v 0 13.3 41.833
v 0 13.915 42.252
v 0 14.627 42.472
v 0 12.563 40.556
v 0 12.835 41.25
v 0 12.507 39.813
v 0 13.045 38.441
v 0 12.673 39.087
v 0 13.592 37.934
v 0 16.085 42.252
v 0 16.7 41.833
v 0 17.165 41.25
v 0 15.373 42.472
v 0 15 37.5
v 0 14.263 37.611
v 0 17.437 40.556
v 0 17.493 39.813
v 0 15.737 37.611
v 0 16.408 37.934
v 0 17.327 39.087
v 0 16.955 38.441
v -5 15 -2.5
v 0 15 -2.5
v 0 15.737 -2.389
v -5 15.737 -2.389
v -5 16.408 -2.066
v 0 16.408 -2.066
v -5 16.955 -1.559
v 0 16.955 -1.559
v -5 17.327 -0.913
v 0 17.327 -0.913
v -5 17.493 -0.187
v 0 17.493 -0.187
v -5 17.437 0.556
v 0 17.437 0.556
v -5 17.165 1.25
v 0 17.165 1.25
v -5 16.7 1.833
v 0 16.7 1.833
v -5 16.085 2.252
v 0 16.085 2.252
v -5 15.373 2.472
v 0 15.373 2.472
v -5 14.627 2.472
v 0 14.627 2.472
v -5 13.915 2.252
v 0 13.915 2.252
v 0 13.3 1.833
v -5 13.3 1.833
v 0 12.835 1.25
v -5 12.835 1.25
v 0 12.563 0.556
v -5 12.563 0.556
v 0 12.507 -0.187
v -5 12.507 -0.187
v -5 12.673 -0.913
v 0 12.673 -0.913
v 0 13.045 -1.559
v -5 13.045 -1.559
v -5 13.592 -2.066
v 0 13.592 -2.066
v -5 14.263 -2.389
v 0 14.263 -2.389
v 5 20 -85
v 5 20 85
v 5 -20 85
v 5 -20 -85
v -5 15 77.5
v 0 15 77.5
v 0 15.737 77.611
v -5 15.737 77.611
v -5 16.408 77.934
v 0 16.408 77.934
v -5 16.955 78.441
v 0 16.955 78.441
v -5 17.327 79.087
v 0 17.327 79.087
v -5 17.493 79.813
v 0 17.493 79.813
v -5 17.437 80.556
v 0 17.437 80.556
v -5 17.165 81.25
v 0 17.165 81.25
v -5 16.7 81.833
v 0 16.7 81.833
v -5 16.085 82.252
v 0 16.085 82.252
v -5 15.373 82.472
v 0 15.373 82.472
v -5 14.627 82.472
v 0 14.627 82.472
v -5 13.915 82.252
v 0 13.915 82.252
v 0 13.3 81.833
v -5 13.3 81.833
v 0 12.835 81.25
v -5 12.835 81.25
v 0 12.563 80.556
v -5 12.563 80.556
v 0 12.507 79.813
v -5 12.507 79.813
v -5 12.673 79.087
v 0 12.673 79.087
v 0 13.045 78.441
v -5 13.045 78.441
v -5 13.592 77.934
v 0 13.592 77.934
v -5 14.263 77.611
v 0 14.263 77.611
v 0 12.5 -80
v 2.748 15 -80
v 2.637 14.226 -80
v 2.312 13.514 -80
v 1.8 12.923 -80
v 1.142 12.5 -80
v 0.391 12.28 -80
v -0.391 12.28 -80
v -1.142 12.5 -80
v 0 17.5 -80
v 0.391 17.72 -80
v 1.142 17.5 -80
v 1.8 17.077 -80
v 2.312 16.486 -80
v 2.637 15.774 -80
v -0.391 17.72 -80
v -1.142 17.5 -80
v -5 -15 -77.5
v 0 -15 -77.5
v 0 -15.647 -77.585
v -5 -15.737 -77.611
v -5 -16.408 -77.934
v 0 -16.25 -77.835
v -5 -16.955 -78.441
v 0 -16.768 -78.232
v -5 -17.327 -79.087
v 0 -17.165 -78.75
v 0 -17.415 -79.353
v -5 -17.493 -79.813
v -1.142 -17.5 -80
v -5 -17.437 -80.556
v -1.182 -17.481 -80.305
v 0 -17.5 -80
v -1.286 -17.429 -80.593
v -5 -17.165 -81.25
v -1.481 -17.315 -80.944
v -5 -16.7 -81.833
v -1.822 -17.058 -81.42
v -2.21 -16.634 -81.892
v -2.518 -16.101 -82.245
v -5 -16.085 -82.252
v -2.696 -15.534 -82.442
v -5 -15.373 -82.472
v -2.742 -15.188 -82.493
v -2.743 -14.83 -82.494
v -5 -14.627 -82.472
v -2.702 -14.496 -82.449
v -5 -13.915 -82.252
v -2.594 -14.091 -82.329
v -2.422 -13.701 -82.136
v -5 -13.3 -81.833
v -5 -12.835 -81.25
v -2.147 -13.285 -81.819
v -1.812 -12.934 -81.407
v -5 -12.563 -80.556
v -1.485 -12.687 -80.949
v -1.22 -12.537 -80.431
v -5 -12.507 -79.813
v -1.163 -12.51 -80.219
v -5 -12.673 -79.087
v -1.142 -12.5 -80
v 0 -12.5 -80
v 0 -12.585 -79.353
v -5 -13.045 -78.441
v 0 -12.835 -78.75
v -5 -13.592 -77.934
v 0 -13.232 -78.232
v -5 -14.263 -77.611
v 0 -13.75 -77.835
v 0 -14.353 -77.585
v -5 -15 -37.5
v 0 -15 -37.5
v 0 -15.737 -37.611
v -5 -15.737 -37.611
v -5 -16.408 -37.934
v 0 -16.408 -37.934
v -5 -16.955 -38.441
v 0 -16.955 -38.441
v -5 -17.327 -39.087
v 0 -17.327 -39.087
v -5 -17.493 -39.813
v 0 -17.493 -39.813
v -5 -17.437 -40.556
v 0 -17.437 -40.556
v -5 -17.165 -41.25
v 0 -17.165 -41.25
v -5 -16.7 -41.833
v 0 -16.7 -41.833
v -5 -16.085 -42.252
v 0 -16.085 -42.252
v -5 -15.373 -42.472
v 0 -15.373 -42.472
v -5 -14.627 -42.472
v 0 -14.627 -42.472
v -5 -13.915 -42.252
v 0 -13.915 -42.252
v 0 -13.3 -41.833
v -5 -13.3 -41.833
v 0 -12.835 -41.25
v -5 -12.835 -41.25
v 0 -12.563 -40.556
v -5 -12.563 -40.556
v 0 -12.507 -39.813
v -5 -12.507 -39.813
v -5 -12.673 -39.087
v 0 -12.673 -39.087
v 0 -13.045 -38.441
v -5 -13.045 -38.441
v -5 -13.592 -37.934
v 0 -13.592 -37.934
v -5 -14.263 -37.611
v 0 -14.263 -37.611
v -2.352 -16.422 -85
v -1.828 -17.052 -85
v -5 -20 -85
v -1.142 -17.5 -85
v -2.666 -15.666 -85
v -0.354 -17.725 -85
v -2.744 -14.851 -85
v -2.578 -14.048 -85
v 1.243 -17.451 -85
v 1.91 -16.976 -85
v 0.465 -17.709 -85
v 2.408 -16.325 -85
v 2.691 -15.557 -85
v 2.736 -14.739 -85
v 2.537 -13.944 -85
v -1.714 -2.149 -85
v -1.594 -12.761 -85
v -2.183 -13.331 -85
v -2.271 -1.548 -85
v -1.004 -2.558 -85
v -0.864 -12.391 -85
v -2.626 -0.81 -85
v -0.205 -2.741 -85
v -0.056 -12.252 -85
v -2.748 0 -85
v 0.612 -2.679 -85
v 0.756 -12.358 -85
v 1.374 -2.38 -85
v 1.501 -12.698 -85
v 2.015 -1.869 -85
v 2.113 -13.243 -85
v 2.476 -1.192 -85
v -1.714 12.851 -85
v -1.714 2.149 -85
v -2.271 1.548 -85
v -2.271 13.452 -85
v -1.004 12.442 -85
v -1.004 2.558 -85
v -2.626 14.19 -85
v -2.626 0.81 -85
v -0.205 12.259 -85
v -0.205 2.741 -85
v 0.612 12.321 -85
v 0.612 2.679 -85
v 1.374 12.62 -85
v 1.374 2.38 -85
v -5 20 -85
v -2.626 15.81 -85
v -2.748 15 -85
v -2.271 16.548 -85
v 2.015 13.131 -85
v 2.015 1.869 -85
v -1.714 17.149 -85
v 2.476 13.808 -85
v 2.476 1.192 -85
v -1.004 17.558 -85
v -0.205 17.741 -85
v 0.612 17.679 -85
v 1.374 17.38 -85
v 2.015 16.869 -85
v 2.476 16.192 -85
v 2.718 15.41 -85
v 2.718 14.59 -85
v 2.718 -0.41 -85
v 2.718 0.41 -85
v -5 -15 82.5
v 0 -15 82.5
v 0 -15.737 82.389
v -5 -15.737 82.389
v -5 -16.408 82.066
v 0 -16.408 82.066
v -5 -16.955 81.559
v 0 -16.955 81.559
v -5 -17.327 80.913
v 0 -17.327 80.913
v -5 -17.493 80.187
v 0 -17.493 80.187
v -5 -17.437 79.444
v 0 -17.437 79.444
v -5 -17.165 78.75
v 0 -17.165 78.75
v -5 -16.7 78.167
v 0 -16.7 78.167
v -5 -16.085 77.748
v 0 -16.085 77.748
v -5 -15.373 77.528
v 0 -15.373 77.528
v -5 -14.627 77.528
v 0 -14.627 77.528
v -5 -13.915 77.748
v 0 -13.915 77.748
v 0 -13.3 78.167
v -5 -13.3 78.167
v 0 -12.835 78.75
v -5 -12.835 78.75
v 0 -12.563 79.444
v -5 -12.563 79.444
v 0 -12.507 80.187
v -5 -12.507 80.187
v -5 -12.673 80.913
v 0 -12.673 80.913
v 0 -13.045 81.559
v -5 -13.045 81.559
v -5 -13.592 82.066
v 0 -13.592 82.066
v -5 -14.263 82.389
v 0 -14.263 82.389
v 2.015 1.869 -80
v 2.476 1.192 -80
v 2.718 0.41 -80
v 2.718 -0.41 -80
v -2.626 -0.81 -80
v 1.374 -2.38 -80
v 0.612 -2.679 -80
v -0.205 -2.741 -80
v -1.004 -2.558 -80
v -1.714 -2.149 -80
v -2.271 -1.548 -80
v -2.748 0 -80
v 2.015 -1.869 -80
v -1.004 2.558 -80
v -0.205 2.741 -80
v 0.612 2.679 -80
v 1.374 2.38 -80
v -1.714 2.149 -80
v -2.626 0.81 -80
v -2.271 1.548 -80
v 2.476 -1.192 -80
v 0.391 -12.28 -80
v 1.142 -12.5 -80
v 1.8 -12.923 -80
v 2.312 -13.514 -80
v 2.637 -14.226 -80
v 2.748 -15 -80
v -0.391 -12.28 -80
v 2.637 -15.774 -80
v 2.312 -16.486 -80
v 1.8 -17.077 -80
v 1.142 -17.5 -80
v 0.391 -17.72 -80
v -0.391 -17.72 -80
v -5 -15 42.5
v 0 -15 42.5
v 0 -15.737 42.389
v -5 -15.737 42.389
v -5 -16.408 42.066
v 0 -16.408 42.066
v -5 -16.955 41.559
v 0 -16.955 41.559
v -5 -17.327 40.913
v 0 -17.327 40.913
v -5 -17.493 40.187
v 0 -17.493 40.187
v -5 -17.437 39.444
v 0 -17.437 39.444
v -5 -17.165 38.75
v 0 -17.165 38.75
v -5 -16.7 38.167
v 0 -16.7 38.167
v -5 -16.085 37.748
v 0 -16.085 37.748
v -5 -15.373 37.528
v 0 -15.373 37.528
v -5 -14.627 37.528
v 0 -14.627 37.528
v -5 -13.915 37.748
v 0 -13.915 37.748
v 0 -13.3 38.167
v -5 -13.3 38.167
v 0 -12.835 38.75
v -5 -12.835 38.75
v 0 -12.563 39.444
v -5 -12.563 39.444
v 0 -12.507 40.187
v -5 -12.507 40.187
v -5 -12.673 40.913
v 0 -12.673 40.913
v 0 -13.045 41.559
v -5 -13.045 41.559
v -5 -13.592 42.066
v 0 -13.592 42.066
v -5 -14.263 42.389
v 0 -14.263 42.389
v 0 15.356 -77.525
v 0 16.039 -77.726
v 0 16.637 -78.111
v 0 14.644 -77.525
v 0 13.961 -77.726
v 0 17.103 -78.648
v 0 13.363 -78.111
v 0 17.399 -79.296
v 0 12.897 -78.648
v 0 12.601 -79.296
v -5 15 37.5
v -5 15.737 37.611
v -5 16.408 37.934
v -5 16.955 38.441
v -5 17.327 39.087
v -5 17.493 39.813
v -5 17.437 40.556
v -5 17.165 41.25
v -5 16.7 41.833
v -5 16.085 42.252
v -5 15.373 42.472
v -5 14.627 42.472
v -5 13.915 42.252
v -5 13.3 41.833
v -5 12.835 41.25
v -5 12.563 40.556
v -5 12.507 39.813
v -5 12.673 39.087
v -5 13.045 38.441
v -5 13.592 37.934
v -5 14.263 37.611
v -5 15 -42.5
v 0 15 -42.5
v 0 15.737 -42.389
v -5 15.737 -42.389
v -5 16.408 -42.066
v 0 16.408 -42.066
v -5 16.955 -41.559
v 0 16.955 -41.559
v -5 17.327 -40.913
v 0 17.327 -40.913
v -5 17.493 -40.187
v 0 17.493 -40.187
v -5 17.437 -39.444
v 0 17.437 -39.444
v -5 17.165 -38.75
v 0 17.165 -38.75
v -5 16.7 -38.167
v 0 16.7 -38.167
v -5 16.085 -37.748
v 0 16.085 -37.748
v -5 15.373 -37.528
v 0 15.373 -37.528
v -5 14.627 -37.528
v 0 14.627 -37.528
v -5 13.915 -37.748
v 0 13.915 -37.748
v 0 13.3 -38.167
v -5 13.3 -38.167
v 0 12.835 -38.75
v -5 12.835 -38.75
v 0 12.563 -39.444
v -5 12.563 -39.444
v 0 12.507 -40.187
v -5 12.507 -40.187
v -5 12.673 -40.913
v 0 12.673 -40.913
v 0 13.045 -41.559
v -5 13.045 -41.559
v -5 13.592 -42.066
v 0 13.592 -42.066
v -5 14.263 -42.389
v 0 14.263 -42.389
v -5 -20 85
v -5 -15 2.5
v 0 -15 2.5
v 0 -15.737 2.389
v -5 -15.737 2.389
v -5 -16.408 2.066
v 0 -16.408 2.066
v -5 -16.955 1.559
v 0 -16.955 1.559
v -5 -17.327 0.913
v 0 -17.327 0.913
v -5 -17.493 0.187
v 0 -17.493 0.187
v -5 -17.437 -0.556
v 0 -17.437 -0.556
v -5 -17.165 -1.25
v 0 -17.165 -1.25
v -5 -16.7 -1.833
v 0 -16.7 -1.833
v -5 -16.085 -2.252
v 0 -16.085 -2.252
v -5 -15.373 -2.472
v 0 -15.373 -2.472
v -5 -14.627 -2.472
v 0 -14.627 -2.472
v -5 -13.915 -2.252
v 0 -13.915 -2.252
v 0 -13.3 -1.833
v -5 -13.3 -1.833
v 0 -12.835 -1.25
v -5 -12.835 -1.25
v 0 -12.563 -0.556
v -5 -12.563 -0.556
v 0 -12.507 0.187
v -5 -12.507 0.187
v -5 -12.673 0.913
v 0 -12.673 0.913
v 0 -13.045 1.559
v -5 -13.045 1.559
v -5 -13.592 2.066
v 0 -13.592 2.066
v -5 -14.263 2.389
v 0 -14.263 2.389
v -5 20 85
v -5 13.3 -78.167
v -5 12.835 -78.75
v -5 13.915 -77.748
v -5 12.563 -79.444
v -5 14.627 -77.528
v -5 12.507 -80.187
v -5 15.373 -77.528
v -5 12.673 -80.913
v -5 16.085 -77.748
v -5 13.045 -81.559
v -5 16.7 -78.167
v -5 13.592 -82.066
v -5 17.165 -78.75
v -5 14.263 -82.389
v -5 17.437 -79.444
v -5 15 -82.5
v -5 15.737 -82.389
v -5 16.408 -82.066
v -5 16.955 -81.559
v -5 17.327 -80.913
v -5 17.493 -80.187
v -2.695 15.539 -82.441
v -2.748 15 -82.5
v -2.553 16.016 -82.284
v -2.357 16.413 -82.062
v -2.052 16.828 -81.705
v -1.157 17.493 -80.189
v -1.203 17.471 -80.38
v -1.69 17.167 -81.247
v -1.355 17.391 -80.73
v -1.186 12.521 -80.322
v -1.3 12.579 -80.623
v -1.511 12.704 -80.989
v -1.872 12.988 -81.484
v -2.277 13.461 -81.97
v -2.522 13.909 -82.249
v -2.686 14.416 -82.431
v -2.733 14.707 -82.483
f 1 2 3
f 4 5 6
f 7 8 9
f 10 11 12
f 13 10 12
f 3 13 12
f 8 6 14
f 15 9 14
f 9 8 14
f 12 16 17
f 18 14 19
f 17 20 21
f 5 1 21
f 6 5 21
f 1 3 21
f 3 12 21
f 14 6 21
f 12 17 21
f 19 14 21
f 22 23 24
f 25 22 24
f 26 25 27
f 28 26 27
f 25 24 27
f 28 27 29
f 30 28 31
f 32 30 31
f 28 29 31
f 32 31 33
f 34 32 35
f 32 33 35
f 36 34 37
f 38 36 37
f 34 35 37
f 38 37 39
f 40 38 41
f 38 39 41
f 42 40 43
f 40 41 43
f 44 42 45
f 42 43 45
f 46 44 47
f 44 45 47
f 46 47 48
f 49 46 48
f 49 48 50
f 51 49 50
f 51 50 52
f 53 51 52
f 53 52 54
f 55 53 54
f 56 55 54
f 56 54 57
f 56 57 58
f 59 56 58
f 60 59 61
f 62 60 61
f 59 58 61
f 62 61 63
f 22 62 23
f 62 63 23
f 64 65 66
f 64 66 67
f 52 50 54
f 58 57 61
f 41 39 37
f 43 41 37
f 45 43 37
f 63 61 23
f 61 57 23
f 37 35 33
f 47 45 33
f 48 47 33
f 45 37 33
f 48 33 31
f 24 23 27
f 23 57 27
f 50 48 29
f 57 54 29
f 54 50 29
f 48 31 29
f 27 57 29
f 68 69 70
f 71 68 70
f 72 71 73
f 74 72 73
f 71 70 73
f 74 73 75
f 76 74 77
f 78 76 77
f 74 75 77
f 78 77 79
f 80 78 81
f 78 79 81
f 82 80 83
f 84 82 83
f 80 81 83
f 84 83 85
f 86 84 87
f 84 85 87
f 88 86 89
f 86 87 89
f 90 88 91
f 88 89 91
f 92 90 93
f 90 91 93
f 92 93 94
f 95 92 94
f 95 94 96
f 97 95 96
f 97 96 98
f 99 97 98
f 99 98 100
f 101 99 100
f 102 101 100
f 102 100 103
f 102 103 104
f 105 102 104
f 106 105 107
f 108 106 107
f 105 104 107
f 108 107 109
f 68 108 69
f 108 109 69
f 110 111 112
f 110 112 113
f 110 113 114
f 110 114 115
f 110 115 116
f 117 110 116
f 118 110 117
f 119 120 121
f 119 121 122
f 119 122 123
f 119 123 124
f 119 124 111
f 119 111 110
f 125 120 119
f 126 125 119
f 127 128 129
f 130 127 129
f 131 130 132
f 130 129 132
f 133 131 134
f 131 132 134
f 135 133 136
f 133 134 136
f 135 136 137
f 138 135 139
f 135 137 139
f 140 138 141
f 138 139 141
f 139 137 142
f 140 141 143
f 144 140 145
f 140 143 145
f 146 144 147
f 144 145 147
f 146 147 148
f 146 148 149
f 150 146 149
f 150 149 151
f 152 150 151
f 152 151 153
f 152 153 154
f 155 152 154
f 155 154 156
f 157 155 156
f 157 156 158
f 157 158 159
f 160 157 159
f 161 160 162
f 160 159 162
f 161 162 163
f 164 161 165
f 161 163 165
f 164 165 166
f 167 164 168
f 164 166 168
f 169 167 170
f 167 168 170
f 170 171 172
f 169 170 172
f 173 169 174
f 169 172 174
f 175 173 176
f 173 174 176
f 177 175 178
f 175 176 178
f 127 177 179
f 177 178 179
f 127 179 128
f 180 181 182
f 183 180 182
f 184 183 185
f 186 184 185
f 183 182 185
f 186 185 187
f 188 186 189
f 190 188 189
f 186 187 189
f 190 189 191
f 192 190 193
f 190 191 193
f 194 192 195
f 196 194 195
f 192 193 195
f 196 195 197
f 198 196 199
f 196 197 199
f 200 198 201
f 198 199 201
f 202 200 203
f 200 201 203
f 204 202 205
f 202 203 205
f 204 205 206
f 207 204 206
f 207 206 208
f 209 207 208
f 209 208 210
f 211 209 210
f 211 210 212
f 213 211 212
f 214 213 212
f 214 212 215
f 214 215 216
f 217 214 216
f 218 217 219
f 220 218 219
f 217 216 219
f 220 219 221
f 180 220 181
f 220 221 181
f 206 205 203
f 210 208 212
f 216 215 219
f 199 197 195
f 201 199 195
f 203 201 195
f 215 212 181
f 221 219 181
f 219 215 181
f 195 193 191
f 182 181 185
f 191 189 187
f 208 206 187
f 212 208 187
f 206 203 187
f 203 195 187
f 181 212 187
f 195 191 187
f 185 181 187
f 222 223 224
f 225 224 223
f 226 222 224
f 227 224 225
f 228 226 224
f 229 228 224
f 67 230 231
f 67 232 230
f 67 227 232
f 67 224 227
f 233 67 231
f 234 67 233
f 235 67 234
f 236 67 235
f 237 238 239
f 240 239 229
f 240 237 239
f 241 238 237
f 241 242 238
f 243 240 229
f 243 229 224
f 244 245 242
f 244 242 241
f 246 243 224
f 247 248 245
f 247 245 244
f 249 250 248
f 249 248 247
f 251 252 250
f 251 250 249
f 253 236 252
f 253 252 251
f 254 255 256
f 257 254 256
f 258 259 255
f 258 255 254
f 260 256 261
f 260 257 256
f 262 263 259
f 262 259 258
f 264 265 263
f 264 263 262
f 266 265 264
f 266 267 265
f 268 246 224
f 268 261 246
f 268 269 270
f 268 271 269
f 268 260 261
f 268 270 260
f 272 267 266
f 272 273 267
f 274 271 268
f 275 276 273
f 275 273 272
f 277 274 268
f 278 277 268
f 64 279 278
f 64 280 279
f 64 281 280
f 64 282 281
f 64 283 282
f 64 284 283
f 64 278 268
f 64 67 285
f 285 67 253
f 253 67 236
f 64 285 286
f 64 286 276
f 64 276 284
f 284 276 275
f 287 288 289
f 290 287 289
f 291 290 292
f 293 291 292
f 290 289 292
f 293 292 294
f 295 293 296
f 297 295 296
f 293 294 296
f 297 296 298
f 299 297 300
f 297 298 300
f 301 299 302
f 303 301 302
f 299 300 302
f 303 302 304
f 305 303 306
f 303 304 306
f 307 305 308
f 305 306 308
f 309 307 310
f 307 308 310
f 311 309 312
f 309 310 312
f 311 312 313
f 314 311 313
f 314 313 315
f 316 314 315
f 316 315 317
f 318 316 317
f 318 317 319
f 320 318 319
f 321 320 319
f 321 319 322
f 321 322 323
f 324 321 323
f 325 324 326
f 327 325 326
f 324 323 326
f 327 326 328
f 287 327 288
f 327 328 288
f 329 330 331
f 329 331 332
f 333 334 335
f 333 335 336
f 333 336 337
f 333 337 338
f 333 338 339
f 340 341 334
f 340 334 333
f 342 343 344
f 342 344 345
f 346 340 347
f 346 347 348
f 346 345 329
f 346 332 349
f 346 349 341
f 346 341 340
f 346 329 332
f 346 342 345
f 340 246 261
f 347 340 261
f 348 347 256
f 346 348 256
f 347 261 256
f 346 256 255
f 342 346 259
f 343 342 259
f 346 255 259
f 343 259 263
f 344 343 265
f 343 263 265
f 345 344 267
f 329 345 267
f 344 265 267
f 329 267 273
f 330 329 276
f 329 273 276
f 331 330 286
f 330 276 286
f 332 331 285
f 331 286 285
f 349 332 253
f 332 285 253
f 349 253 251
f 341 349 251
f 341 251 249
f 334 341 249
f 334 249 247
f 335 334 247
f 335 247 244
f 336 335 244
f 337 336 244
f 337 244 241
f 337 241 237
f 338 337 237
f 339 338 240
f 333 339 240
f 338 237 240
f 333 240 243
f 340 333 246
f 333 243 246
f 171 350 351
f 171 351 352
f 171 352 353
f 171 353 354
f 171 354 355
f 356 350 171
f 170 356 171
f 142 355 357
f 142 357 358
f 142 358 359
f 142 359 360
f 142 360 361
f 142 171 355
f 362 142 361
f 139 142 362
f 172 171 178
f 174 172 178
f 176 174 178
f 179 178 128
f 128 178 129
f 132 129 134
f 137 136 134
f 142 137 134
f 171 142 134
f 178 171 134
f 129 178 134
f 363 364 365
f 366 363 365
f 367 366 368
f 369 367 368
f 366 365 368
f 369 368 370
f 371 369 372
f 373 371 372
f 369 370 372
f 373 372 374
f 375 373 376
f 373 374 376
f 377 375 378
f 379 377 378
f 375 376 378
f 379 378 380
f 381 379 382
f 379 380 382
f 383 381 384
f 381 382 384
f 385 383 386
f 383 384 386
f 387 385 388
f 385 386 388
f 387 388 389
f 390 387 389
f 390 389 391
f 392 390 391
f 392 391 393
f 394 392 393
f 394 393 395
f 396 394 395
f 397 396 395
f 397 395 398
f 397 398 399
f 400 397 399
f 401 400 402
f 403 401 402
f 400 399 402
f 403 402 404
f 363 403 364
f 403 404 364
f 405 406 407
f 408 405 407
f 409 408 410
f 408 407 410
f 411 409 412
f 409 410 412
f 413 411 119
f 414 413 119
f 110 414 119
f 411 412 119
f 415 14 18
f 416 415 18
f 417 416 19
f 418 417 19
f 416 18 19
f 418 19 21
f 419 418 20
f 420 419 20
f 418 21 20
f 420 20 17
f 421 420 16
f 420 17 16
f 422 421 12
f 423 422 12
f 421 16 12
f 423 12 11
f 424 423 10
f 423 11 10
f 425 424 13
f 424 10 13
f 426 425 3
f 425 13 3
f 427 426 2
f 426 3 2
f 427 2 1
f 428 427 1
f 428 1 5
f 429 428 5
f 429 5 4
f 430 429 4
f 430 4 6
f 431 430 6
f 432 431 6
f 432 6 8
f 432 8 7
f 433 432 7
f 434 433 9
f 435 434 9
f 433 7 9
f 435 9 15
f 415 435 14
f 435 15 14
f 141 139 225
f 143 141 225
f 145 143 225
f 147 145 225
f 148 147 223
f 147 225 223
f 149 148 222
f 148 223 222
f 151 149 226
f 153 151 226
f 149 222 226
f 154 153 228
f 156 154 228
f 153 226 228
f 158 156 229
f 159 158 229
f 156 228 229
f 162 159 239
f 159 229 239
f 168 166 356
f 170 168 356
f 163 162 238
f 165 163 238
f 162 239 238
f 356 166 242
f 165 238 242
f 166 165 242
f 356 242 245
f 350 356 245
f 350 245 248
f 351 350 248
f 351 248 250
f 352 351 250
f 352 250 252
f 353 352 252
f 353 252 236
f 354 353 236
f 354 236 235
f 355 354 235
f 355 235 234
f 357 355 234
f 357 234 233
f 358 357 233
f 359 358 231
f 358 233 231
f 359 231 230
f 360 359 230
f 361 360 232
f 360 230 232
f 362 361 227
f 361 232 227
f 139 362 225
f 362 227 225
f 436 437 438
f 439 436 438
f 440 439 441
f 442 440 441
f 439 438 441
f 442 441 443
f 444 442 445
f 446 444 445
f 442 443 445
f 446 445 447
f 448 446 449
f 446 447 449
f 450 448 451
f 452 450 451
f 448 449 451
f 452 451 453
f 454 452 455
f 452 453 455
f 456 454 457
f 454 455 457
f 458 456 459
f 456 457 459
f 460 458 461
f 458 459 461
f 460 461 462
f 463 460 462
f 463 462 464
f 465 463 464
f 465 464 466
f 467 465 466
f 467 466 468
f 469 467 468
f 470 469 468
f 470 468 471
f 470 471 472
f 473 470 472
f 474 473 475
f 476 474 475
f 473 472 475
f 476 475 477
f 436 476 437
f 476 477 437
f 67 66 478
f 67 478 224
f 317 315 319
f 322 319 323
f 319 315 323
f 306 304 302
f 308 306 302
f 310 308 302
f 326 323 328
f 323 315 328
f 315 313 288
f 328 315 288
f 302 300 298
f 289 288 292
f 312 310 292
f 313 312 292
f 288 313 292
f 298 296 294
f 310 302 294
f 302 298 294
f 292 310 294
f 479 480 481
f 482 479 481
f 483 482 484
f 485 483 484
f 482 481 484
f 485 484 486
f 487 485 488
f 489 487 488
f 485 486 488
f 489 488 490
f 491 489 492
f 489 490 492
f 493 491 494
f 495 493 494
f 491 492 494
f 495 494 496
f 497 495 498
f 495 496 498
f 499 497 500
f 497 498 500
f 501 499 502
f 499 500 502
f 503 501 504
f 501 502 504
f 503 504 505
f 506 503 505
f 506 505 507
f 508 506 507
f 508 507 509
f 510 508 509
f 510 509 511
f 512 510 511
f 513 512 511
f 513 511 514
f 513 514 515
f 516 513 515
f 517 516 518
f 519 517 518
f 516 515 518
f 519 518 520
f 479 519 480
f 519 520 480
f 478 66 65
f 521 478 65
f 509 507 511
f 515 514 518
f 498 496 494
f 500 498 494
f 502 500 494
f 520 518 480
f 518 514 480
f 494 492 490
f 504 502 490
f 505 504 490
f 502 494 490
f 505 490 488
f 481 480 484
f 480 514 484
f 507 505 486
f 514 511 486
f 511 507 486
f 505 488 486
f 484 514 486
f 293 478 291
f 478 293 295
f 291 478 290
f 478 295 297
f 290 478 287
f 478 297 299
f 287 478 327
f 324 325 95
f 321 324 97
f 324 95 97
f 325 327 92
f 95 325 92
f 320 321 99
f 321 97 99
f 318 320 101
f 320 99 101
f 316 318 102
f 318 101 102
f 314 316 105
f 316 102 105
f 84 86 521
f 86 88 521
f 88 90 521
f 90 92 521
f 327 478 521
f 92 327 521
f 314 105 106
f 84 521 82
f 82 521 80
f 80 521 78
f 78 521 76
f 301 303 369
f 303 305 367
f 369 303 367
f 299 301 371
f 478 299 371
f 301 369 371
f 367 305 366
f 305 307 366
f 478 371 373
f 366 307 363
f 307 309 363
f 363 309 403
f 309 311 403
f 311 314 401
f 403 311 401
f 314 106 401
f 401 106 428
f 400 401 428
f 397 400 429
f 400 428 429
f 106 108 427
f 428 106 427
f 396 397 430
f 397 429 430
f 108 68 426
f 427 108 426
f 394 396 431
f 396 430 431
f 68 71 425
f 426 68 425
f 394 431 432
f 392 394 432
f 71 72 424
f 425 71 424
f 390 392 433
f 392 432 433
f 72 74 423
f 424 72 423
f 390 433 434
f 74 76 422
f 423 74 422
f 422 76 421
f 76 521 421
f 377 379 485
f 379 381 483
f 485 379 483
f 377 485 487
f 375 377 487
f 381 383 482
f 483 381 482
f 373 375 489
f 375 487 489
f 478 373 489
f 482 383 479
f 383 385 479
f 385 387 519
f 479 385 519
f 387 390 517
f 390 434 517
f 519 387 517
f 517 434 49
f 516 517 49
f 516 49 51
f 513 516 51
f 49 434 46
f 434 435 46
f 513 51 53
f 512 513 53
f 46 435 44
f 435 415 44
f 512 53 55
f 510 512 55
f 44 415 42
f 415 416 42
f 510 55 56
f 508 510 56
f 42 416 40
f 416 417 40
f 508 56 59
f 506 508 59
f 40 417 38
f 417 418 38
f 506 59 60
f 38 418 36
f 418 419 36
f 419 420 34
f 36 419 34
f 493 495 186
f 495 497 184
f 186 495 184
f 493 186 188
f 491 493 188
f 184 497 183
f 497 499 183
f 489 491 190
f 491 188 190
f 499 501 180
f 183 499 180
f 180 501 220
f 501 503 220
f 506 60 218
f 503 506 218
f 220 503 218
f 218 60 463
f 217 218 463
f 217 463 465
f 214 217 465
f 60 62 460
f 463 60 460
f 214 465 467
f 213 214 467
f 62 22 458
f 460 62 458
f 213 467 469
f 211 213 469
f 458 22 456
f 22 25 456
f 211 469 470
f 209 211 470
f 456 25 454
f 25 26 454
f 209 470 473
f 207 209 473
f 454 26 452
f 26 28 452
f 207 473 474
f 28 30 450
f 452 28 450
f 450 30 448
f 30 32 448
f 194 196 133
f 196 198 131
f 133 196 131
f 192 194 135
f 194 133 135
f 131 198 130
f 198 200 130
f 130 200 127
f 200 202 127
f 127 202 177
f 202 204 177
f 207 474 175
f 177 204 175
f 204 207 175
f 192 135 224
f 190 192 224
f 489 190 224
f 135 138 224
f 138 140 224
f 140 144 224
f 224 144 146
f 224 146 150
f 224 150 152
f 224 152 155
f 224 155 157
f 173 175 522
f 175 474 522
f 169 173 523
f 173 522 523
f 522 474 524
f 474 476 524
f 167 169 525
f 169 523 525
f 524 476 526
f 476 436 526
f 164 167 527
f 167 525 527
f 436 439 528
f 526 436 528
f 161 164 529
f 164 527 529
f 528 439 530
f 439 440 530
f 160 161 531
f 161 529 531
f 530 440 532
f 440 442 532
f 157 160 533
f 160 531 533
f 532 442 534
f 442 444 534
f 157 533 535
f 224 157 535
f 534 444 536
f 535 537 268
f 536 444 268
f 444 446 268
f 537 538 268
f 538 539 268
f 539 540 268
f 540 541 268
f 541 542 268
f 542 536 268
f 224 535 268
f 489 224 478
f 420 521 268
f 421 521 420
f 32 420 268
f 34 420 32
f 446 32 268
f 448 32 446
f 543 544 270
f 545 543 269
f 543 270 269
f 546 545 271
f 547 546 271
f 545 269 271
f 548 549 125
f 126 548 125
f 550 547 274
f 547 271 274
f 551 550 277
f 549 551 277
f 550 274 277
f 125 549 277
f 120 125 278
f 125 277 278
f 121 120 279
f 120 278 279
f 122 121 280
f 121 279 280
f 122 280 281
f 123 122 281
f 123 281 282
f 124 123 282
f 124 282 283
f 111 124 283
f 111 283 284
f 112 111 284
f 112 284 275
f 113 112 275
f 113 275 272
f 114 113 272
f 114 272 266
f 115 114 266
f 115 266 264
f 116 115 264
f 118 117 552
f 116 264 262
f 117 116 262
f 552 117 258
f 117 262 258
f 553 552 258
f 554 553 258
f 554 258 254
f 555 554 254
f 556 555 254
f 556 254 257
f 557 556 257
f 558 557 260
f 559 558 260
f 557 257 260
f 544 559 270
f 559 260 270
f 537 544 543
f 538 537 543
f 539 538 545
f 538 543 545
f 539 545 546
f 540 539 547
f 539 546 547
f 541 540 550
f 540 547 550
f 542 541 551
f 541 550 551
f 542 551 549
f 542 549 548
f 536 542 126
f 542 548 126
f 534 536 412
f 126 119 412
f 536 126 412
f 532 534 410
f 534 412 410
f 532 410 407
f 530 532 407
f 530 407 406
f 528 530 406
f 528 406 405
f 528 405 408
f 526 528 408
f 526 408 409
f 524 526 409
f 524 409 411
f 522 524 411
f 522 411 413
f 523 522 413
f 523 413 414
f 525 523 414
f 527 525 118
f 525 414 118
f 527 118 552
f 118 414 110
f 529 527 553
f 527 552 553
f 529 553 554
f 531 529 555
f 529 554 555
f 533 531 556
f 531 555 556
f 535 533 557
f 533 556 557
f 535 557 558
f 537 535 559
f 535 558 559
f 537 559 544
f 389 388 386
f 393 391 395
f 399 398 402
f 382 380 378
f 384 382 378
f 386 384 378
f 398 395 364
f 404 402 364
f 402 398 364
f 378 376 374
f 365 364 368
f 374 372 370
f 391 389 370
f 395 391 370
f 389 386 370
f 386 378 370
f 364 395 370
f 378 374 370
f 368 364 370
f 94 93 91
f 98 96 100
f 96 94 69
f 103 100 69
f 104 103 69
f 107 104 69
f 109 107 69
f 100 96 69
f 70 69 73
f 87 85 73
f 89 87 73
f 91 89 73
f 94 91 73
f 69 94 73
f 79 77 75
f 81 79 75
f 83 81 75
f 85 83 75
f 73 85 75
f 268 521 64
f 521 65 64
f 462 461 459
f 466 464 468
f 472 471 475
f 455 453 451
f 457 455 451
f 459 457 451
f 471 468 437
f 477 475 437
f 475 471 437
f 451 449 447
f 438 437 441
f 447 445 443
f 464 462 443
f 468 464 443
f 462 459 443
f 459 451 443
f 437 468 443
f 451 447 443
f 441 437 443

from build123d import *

# Parameters (mm, degrees)
CROQUIS1_W              = 170
CROQUIS1_H              = 40
SALIENTE_EXTRUIR1_DEPTH = 5
CROQUIS2_R              = 2.5
CORTAR_EXTRUIR1_DEPTH   = 5
CROQUIS3_R              = 2.748332181
CORTAR_EXTRUIR2_DEPTH   = 5


with BuildPart() as part:
    # Croquis1 → Saliente-Extruir1 (new, symmetric)
    with BuildSketch(Plane(origin=(0, 0, 0), x_dir=(0, 0, -1), z_dir=(1, 0, 0))):
        Rectangle(CROQUIS1_W, CROQUIS1_H)
    extrude(amount=SALIENTE_EXTRUIR1_DEPTH, both=True)

    # Croquis2 → Cortar-Extruir1 (cut)
    with BuildSketch(Plane(origin=(0, 0, 0), x_dir=(0, 0, -1), z_dir=(1, 0, 0))):
        with Locations((-80, 15)):
            Circle(CROQUIS2_R)
        with Locations((-40, 15)):
            Circle(CROQUIS2_R)
        with Locations((0, 15)):
            Circle(CROQUIS2_R)
        with Locations((40, 15)):
            Circle(CROQUIS2_R)
        with Locations((80, 15)):
            Circle(CROQUIS2_R)
        with Locations(Location((80, -15, 0), (0, 0, 180))):
            Circle(CROQUIS2_R)
        with Locations(Location((40, -15, 0), (0, 0, 180))):
            Circle(CROQUIS2_R)
        with Locations(Location((0, -15, 0), (0, 0, 180))):
            Circle(CROQUIS2_R)
        with Locations(Location((-40, -15, 0), (0, 0, 180))):
            Circle(CROQUIS2_R)
        with Locations(Location((-80, -15, 0), (0, 0, 180))):
            Circle(CROQUIS2_R)
    extrude(amount=-CORTAR_EXTRUIR1_DEPTH, mode=Mode.SUBTRACT)

    # Croquis3 → Cortar-Extruir2 (cut)
    with BuildSketch(Plane(origin=(0, 0, -85), x_dir=(-1, 0, 0), z_dir=(0, 0, -1))):
        with Locations((0, 15)):
            Circle(CROQUIS3_R)
        with Locations(Location((0, -15, 0), (0, 0, 294.543993406))):
            Circle(CROQUIS3_R)
        Circle(CROQUIS3_R)
    extrude(amount=-CORTAR_EXTRUIR2_DEPTH, mode=Mode.SUBTRACT)


solid = part.part
